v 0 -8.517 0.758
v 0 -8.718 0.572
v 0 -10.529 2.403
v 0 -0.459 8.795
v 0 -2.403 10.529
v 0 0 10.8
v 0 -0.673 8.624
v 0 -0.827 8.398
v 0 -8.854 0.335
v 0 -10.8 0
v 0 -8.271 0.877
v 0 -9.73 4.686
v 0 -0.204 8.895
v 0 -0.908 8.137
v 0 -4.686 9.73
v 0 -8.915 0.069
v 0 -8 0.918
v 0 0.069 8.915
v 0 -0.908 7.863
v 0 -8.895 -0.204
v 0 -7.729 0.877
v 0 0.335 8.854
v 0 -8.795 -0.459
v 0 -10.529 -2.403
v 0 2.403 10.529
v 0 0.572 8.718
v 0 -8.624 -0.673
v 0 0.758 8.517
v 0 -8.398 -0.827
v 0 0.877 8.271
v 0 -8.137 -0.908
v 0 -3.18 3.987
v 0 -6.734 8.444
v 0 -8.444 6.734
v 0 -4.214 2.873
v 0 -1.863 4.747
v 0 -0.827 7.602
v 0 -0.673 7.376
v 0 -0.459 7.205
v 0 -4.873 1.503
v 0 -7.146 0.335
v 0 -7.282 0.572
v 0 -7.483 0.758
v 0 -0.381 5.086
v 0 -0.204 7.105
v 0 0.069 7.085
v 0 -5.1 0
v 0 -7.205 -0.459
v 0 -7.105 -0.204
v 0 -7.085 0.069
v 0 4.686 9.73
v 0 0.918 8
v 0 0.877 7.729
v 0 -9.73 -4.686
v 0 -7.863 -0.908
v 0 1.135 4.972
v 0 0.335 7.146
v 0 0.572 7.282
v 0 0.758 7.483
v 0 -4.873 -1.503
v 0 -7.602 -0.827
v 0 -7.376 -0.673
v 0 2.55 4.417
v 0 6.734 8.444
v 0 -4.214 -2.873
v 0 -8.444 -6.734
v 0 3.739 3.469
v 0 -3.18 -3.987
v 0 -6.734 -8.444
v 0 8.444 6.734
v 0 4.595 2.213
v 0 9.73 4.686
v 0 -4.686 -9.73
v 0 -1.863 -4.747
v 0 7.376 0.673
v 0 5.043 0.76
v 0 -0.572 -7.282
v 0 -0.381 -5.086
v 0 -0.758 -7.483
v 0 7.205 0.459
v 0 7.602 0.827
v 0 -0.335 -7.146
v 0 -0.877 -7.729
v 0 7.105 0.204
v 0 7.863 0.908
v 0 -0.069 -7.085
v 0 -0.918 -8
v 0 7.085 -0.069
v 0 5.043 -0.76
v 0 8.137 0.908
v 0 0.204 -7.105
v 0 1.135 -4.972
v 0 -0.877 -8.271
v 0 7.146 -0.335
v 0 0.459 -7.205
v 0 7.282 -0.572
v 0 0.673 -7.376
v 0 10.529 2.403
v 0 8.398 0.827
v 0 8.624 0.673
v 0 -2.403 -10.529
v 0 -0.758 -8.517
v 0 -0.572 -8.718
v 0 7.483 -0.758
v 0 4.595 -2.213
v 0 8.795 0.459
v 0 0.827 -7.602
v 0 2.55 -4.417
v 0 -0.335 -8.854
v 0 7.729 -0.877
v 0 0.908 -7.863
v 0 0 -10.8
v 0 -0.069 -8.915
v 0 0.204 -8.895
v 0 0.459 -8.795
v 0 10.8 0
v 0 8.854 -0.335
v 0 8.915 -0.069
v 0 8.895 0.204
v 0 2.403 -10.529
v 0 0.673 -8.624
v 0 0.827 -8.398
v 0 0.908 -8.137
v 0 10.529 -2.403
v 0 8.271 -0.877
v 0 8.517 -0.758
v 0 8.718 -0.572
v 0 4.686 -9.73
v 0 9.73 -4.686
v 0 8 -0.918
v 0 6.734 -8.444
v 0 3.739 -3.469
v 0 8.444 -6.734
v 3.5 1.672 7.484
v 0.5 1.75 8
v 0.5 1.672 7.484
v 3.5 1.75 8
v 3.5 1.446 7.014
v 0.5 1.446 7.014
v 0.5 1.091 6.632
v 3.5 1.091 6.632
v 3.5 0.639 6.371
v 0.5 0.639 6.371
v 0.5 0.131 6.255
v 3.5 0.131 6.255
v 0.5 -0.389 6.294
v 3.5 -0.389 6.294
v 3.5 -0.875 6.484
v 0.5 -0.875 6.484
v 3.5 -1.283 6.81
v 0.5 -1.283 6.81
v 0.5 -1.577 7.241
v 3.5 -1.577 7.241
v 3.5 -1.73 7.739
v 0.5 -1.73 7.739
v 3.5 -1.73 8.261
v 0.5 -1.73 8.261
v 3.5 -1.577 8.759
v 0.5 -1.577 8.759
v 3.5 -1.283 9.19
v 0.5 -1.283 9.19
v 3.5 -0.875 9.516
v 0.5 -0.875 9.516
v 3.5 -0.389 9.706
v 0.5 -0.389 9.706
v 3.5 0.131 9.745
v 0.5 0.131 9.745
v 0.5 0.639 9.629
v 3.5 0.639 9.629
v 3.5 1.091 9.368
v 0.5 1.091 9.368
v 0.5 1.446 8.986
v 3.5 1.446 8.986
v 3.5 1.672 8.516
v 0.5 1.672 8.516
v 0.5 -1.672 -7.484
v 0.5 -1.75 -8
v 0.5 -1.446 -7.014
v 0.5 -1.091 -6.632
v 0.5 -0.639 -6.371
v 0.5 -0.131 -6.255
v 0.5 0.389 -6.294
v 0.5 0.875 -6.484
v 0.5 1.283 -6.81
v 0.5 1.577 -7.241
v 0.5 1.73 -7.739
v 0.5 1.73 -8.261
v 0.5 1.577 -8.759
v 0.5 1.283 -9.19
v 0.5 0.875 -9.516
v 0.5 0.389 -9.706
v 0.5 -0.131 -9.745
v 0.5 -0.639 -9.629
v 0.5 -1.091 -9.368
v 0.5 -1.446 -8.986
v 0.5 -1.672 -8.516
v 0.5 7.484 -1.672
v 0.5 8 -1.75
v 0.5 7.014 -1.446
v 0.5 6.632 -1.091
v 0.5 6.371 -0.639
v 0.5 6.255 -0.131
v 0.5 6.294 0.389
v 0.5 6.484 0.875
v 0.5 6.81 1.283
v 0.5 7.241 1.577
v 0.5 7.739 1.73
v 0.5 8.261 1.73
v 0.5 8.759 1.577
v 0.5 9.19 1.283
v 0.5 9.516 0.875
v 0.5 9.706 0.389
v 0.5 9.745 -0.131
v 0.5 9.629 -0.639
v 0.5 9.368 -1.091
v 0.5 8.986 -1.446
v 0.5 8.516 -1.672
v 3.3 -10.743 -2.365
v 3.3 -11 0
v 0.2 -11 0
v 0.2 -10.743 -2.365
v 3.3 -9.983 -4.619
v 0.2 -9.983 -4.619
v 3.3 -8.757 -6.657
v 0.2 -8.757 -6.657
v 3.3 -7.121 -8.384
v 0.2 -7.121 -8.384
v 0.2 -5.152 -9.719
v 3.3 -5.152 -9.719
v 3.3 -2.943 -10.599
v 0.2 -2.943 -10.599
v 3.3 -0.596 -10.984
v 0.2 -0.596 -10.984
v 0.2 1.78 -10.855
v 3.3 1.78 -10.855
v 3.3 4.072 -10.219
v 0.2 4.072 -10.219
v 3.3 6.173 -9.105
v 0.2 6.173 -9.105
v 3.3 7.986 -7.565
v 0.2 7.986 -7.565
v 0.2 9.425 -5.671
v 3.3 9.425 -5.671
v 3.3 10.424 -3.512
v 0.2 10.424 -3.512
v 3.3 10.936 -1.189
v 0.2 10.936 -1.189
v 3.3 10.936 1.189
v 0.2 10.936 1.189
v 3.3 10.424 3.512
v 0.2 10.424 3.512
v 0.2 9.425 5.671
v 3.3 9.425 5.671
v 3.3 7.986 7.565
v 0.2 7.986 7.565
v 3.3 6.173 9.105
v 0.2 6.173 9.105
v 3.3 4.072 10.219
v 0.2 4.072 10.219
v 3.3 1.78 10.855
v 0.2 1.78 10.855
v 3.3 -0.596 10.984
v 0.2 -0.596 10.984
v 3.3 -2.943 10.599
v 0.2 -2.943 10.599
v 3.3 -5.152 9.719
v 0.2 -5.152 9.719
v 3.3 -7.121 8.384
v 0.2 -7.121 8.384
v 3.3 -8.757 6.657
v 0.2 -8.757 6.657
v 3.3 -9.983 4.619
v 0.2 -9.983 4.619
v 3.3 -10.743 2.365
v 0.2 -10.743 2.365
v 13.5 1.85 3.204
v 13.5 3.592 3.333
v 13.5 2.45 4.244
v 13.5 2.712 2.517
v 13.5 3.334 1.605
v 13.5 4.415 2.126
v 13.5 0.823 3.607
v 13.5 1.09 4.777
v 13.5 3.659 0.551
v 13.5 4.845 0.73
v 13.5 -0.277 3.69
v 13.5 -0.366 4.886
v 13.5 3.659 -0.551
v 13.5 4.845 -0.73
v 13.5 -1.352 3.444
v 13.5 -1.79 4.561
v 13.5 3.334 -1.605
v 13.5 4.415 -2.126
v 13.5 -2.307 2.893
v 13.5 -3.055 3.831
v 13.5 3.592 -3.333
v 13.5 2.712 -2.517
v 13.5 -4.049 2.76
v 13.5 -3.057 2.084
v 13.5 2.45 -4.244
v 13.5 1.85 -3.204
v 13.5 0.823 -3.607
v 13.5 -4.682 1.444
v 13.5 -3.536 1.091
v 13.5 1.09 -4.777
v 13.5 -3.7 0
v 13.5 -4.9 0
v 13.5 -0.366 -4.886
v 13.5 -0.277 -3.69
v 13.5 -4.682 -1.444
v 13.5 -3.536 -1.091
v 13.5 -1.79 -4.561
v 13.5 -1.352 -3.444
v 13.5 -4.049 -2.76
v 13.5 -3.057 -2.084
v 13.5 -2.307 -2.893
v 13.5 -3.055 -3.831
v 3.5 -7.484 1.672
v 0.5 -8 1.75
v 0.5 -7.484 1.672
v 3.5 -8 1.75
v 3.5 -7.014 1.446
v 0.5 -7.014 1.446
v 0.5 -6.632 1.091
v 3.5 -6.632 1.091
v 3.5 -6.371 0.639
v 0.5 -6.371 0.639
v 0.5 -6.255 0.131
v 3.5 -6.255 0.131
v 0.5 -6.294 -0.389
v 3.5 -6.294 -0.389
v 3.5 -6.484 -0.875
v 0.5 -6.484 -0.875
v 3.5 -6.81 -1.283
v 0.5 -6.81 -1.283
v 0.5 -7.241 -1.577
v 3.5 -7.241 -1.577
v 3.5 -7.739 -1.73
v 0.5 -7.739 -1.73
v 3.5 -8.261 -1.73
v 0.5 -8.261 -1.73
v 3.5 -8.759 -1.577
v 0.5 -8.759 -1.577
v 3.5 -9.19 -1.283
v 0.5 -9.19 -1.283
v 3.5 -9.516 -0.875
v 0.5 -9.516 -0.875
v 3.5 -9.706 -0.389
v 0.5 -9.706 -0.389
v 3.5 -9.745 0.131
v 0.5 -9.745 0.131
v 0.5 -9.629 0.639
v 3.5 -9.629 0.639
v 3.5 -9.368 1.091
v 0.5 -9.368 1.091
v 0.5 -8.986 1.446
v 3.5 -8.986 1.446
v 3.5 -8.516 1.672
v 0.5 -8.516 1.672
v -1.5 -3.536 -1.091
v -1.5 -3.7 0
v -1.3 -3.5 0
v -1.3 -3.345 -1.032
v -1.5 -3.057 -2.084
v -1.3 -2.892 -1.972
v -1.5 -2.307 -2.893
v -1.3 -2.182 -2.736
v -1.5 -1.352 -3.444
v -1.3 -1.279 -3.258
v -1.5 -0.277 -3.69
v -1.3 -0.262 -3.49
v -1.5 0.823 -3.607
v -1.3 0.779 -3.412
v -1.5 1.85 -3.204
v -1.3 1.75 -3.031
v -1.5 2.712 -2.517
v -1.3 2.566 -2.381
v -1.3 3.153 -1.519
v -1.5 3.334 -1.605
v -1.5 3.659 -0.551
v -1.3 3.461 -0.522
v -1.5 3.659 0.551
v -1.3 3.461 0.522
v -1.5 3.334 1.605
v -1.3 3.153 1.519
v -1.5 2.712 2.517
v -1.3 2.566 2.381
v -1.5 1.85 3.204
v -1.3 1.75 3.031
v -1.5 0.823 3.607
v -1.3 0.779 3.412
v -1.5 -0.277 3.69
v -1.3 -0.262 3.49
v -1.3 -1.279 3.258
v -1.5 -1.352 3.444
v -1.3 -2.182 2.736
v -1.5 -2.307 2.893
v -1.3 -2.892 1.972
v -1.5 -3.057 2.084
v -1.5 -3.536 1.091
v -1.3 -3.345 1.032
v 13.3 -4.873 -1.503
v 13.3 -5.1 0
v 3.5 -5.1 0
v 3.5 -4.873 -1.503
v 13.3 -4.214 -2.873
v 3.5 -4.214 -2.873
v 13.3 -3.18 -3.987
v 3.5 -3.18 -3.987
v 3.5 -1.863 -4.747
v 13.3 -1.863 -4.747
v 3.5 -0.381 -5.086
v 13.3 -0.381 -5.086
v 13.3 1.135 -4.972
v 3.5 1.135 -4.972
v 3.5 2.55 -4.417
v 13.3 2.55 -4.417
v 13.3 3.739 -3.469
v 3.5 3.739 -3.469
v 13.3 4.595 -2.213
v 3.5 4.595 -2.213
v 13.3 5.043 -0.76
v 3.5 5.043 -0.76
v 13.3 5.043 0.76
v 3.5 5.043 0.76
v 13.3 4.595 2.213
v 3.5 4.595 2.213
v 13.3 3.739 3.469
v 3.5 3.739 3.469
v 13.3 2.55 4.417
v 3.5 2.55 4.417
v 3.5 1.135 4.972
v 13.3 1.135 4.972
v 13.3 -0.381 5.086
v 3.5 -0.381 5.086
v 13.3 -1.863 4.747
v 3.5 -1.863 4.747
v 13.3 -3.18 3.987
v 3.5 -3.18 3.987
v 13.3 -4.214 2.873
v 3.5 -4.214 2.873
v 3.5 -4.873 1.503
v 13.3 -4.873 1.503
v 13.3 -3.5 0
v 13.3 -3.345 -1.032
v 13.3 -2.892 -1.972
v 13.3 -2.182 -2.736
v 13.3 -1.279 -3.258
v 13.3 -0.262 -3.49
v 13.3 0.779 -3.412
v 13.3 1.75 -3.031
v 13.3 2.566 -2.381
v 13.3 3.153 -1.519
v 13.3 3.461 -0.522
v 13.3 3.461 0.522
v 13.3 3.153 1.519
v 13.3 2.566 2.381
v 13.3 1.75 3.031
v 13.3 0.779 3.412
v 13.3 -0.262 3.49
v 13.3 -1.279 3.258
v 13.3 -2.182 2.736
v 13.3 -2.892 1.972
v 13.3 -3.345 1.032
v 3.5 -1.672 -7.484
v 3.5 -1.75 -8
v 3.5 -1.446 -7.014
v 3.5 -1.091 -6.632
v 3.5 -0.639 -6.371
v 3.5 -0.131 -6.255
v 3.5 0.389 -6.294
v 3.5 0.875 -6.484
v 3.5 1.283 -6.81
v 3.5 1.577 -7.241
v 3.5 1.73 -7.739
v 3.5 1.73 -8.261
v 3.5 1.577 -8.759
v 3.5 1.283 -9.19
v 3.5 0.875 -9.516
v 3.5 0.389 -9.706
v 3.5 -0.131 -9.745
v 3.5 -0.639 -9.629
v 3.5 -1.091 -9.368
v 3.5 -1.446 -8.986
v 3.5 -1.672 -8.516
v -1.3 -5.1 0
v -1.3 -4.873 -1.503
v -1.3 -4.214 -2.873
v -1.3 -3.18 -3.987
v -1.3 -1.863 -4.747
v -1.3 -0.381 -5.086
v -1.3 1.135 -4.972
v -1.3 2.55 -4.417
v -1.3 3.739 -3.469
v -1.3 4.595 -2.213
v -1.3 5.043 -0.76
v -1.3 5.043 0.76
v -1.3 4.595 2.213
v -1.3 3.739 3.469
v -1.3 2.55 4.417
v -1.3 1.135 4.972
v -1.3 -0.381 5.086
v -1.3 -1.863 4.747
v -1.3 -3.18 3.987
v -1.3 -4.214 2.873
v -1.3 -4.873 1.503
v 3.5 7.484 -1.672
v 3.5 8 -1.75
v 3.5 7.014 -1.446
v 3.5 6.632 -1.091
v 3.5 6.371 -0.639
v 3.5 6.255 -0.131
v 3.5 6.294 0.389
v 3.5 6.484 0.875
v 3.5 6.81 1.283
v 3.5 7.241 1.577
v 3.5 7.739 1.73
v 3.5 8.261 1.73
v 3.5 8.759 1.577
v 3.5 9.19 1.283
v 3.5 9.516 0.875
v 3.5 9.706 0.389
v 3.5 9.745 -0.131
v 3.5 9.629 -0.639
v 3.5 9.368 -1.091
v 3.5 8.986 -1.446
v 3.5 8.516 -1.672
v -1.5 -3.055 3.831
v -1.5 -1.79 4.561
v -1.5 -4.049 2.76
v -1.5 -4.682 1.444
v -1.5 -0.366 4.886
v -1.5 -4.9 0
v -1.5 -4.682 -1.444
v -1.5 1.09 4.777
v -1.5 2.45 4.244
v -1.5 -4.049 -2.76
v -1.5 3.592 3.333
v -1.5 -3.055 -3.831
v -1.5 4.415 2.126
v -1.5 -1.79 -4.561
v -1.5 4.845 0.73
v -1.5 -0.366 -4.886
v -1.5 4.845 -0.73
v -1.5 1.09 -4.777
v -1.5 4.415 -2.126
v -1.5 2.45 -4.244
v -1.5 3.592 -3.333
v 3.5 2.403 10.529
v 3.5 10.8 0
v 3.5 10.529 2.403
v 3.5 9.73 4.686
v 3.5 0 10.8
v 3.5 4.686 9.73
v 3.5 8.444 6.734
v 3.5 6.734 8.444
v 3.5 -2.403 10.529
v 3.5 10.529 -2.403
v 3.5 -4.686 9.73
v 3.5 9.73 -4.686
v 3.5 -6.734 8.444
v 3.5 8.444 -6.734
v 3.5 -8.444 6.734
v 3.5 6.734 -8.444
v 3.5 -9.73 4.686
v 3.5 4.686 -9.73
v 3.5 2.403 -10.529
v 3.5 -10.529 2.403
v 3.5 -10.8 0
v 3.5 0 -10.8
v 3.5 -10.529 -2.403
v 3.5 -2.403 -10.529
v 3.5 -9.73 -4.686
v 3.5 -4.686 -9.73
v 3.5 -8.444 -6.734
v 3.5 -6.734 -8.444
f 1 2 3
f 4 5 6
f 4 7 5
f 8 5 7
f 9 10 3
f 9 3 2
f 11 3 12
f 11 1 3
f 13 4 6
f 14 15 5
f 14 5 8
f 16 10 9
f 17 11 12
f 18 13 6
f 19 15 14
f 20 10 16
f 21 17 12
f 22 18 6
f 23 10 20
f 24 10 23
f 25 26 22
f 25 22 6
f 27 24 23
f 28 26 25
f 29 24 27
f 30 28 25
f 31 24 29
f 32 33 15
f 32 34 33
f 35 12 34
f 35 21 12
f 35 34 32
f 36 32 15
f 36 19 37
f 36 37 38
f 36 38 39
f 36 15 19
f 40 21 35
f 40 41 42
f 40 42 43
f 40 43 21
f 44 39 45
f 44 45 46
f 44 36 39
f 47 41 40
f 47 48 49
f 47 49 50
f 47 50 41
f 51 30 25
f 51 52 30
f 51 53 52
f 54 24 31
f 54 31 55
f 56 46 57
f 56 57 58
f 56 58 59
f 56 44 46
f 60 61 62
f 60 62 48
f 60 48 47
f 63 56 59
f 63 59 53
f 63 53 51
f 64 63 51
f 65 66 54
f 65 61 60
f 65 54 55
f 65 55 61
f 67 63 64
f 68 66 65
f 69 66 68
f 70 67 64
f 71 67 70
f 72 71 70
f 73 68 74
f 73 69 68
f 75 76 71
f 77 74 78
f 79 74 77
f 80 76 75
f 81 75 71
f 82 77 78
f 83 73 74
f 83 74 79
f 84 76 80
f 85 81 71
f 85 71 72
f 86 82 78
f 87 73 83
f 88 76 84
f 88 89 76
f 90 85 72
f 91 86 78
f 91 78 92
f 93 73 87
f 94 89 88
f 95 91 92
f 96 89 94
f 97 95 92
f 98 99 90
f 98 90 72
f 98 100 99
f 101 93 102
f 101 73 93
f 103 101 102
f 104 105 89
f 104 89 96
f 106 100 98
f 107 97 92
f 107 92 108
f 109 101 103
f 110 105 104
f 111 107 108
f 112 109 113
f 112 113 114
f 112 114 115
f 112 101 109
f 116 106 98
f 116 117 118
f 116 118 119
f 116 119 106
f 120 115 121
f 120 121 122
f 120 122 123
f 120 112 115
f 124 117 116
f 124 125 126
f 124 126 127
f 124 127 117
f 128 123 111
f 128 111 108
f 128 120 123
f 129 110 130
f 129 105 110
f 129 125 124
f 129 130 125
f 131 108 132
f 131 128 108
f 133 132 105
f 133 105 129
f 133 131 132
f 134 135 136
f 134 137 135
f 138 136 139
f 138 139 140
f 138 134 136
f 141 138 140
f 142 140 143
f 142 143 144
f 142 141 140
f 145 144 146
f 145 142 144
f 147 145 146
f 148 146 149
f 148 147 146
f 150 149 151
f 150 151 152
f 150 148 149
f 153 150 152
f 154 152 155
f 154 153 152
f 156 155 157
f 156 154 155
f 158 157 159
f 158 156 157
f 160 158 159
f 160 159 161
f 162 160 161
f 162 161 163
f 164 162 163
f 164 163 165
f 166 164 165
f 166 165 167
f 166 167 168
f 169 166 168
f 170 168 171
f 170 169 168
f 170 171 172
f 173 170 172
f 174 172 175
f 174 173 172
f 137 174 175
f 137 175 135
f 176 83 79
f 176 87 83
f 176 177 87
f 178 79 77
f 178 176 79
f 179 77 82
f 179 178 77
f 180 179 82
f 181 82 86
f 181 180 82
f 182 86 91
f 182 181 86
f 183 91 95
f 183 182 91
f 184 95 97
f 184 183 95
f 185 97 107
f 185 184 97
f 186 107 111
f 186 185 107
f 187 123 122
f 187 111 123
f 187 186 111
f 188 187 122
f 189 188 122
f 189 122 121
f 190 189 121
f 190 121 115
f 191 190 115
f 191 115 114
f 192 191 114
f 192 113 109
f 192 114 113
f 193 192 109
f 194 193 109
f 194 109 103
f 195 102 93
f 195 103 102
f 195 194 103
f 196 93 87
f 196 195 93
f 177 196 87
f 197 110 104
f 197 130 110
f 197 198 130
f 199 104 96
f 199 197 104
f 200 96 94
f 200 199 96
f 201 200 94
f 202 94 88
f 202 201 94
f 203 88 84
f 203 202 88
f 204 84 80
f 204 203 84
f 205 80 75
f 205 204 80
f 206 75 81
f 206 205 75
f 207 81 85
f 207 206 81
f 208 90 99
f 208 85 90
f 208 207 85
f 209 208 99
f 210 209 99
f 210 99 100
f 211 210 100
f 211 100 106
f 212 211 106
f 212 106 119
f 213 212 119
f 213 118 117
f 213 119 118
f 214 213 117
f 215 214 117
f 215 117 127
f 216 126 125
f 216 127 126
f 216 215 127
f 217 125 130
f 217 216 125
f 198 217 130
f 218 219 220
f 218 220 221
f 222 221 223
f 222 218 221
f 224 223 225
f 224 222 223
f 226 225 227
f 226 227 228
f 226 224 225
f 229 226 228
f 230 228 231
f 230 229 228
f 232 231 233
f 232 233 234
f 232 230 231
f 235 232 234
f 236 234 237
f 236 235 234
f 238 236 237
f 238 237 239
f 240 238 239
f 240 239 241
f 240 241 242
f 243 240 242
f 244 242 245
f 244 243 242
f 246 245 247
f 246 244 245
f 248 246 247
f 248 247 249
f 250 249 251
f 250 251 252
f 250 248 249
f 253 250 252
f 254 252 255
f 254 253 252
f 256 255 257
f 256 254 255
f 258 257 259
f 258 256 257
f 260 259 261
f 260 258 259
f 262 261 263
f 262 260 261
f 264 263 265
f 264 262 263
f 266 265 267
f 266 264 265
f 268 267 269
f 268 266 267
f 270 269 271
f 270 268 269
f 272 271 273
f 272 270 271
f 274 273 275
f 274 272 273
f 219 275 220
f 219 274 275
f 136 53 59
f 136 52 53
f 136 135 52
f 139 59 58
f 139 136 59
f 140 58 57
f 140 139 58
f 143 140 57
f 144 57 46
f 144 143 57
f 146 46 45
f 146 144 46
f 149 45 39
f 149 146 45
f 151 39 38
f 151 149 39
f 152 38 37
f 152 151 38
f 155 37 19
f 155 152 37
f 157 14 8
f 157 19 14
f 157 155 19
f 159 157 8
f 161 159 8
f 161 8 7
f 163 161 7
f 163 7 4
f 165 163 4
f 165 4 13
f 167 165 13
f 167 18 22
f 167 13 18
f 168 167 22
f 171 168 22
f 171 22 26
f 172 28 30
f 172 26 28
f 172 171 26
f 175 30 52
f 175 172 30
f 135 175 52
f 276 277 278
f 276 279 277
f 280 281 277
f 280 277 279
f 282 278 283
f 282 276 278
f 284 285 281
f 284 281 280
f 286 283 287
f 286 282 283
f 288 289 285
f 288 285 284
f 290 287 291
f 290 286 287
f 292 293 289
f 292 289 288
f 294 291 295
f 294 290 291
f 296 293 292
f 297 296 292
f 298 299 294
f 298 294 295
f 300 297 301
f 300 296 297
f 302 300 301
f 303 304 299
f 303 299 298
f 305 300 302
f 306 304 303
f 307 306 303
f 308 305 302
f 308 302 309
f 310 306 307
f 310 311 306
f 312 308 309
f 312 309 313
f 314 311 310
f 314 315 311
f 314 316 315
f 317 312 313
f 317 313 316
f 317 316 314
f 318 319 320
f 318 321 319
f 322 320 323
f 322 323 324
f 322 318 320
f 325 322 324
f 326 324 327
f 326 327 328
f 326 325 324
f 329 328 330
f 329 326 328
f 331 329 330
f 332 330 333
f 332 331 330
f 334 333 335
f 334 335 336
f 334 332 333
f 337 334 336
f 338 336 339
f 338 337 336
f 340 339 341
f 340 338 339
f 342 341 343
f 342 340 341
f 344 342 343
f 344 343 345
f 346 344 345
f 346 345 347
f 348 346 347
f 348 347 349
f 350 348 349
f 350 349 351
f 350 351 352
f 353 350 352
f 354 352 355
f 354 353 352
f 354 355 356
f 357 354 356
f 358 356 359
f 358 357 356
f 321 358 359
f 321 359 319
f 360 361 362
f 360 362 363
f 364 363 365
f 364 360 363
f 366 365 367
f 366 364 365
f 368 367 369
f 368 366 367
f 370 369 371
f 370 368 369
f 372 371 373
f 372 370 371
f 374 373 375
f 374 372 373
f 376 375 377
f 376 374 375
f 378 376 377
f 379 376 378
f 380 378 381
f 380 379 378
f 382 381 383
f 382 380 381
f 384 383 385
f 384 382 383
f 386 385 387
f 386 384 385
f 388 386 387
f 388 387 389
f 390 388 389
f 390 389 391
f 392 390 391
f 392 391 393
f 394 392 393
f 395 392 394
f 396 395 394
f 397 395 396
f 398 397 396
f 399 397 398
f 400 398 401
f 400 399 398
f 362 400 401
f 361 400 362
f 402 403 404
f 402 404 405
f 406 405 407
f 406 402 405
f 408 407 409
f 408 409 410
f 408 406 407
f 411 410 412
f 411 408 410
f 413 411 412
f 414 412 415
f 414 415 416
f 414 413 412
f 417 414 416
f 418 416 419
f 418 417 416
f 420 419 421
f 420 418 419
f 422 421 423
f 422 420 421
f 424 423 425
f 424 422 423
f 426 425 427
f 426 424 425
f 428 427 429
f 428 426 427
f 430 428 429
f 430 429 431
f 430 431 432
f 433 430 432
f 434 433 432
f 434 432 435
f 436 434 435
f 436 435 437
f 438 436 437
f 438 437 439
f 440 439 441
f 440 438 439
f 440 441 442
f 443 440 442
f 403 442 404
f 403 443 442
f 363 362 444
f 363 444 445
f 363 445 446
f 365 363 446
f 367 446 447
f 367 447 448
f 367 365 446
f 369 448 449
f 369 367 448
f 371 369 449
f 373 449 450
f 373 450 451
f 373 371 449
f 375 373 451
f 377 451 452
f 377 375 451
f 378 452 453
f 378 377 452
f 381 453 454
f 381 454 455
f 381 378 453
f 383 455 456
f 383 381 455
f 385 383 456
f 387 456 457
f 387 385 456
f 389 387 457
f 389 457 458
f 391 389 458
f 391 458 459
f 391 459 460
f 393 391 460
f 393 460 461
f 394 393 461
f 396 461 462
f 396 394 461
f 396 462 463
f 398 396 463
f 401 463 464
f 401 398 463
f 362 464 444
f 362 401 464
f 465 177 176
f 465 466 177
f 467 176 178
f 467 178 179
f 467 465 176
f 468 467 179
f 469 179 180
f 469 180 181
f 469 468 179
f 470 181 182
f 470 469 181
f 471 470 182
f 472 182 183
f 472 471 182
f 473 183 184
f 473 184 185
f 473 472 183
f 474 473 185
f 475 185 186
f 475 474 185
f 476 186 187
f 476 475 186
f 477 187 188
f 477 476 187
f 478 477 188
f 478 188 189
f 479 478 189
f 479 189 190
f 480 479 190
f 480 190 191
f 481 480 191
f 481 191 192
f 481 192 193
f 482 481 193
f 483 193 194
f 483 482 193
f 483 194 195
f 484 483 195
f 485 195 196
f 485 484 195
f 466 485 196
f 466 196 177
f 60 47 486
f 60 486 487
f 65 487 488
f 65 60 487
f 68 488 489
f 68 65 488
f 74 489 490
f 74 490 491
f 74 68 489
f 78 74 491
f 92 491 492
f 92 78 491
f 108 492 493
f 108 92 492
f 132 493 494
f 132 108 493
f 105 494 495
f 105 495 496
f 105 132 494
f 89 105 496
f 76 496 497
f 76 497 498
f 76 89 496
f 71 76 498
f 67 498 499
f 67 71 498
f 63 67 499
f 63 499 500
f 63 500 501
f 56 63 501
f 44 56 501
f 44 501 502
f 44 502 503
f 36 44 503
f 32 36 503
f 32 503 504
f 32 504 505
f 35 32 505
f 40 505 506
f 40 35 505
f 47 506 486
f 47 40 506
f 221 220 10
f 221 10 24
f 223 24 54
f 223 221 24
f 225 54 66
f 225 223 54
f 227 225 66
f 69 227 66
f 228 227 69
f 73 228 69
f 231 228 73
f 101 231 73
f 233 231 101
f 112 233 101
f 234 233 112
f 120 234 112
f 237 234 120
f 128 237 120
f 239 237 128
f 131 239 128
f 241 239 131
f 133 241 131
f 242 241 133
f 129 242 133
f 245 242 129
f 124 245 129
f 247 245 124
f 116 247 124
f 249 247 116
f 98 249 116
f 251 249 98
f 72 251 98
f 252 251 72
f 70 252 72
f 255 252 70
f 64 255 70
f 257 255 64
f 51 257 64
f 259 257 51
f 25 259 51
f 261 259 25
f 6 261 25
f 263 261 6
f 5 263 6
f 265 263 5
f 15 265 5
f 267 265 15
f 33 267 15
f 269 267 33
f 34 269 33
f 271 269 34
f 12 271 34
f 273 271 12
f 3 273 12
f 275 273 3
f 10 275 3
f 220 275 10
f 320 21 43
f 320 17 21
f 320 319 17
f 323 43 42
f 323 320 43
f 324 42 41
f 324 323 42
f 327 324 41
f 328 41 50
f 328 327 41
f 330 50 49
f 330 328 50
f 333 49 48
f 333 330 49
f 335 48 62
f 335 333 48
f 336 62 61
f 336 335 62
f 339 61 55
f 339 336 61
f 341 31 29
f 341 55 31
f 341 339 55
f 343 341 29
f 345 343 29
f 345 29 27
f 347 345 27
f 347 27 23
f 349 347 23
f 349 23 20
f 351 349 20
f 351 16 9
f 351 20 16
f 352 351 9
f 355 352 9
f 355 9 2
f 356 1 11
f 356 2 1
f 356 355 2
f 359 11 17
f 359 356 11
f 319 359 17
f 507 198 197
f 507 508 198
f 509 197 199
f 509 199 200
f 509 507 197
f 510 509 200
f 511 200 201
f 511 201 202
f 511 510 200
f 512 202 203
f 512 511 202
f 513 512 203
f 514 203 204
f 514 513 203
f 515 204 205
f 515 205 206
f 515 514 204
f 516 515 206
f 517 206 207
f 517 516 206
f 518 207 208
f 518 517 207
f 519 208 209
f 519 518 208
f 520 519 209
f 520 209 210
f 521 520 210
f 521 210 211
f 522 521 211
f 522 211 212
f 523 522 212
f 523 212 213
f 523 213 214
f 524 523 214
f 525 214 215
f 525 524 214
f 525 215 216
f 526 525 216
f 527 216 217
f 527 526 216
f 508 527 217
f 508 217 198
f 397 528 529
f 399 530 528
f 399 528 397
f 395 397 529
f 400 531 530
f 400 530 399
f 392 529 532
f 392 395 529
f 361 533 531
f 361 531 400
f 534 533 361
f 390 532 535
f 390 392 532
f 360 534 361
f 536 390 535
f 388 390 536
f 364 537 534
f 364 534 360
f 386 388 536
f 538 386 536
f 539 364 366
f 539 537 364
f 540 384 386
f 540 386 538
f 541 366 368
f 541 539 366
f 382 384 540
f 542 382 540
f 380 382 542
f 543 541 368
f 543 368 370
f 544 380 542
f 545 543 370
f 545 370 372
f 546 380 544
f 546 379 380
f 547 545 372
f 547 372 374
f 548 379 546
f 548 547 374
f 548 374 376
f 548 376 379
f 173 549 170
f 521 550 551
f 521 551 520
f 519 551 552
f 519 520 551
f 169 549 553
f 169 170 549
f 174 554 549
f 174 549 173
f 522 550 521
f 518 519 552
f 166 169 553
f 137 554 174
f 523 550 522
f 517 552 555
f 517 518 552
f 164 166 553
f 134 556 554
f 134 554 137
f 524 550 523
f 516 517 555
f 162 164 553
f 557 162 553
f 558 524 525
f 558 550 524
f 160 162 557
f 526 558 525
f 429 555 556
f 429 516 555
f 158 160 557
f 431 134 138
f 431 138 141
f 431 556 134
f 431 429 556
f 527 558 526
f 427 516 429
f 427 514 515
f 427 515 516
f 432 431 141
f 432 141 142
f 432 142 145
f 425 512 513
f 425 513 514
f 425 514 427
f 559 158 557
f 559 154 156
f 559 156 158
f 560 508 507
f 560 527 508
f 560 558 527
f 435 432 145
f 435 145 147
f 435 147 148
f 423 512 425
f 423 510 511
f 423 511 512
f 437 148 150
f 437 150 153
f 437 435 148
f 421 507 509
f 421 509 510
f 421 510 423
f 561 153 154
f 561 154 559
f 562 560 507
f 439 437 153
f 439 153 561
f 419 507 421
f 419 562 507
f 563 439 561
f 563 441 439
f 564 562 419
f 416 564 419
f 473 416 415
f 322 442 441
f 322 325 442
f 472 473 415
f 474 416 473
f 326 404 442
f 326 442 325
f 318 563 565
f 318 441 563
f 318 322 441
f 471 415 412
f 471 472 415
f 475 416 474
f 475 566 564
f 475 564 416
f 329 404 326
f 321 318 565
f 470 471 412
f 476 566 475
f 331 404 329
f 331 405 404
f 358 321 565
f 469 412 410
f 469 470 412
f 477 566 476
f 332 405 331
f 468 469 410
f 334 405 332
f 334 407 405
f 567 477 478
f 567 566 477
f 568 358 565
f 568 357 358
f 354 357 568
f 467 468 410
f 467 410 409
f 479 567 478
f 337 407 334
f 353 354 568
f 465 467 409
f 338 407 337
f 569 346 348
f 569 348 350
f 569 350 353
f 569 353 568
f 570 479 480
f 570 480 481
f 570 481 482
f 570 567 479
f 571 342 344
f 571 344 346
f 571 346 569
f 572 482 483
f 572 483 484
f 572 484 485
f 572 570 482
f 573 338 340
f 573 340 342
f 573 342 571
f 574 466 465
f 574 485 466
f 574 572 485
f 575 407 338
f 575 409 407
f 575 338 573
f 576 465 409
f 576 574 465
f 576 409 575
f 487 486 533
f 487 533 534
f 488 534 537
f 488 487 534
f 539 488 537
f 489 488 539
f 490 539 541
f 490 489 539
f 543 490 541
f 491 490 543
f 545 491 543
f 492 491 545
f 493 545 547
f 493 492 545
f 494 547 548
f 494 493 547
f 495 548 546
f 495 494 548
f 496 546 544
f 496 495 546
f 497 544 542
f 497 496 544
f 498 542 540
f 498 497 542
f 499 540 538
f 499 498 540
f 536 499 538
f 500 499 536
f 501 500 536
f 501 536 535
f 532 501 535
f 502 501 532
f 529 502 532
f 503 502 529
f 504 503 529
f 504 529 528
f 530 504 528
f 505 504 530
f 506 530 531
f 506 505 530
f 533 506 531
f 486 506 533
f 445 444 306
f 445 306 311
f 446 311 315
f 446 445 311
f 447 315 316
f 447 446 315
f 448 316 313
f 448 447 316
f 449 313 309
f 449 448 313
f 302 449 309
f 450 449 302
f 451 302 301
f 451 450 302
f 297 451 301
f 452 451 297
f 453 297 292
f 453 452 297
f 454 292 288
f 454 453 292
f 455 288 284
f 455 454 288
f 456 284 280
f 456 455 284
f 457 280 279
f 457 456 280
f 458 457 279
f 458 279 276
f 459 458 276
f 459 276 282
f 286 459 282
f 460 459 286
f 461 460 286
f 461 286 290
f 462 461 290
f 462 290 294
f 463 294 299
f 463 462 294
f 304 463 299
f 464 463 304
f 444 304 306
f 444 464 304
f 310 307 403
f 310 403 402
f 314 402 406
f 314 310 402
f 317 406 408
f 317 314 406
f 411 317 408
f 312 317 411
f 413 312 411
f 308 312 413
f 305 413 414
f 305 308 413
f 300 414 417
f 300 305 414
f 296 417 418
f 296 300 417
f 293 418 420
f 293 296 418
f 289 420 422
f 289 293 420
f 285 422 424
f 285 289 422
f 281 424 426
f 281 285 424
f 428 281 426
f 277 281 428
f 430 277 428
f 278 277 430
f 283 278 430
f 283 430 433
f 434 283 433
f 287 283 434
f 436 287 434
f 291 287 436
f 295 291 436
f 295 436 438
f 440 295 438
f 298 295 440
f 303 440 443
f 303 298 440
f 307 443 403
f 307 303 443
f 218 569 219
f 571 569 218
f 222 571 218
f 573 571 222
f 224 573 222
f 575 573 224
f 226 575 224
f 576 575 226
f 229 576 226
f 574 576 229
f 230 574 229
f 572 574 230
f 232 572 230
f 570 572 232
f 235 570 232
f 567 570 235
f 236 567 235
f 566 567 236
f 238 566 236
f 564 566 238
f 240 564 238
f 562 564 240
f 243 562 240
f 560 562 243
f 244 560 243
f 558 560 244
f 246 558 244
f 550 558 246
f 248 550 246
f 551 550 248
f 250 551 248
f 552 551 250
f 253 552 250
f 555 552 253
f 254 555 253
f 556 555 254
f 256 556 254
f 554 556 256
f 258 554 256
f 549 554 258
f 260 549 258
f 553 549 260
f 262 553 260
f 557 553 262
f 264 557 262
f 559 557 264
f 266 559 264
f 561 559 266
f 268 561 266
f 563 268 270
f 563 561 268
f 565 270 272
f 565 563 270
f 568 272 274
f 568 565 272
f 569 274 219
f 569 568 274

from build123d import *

# Parameters (mm, degrees)
CHAMFER1_SIZE     = 0.2
CIRPATTERN1_COUNT = 4


with BuildPart() as part:
    # Sketch1 → Revolve1 (revolve)
    with BuildSketch(Plane.XY, mode=Mode.PRIVATE) as revolve1_sk:
        Polygon((0, 5.1), (0, 11), (3.5, 11), (3.5, 5.1), (13.5, 5.1), (13.5, 3.5), (-1.5, 3.5), (-1.5, 5.1), align=None)
    revolve(revolve1_sk.sketch.rotate(Axis((0, 0, 0), (1, 0, 0)), 180), axis=Axis((0, 0, 0), (1, 0, 0)))

    # Chamfer1
    chamfer1_edges = [part.edges().sort_by_distance(p)[0] for p in [
        (-1.5, 3.5, 0),
        (13.5, 3.5, 0),
        (13.5, 5.1, 0),
        (3.5, 11, 0),
        (0, 11, 0),
        (-1.5, 5.1, 0),
    ]]
    chamfer(chamfer1_edges, length=CHAMFER1_SIZE)

    # Sketch5 → M3 Clearance Hole1 (revolve, cut)
    with BuildSketch(Plane(origin=(3.5, 8, 0), x_dir=(0, 0, -1), z_dir=(0, 1, 0))):
        Polygon((0, 0), (0, 4.051506083), (1.75, 3), (1.75, 0), align=None)
    m3_clearance_hole1 = revolve(axis=Axis((9.85, 8, 0), (-1, 0, 0)), mode=Mode.SUBTRACT)

    # CirPattern1: M3 Clearance Hole1 ×4 about axis
    cirpattern1_axis = Axis((0, 0, 0), (1, 0, 0))
    for i in range(1, CIRPATTERN1_COUNT):
        add(m3_clearance_hole1.rotate(cirpattern1_axis, i * 360 / CIRPATTERN1_COUNT), mode=Mode.SUBTRACT)


solid = part.part
